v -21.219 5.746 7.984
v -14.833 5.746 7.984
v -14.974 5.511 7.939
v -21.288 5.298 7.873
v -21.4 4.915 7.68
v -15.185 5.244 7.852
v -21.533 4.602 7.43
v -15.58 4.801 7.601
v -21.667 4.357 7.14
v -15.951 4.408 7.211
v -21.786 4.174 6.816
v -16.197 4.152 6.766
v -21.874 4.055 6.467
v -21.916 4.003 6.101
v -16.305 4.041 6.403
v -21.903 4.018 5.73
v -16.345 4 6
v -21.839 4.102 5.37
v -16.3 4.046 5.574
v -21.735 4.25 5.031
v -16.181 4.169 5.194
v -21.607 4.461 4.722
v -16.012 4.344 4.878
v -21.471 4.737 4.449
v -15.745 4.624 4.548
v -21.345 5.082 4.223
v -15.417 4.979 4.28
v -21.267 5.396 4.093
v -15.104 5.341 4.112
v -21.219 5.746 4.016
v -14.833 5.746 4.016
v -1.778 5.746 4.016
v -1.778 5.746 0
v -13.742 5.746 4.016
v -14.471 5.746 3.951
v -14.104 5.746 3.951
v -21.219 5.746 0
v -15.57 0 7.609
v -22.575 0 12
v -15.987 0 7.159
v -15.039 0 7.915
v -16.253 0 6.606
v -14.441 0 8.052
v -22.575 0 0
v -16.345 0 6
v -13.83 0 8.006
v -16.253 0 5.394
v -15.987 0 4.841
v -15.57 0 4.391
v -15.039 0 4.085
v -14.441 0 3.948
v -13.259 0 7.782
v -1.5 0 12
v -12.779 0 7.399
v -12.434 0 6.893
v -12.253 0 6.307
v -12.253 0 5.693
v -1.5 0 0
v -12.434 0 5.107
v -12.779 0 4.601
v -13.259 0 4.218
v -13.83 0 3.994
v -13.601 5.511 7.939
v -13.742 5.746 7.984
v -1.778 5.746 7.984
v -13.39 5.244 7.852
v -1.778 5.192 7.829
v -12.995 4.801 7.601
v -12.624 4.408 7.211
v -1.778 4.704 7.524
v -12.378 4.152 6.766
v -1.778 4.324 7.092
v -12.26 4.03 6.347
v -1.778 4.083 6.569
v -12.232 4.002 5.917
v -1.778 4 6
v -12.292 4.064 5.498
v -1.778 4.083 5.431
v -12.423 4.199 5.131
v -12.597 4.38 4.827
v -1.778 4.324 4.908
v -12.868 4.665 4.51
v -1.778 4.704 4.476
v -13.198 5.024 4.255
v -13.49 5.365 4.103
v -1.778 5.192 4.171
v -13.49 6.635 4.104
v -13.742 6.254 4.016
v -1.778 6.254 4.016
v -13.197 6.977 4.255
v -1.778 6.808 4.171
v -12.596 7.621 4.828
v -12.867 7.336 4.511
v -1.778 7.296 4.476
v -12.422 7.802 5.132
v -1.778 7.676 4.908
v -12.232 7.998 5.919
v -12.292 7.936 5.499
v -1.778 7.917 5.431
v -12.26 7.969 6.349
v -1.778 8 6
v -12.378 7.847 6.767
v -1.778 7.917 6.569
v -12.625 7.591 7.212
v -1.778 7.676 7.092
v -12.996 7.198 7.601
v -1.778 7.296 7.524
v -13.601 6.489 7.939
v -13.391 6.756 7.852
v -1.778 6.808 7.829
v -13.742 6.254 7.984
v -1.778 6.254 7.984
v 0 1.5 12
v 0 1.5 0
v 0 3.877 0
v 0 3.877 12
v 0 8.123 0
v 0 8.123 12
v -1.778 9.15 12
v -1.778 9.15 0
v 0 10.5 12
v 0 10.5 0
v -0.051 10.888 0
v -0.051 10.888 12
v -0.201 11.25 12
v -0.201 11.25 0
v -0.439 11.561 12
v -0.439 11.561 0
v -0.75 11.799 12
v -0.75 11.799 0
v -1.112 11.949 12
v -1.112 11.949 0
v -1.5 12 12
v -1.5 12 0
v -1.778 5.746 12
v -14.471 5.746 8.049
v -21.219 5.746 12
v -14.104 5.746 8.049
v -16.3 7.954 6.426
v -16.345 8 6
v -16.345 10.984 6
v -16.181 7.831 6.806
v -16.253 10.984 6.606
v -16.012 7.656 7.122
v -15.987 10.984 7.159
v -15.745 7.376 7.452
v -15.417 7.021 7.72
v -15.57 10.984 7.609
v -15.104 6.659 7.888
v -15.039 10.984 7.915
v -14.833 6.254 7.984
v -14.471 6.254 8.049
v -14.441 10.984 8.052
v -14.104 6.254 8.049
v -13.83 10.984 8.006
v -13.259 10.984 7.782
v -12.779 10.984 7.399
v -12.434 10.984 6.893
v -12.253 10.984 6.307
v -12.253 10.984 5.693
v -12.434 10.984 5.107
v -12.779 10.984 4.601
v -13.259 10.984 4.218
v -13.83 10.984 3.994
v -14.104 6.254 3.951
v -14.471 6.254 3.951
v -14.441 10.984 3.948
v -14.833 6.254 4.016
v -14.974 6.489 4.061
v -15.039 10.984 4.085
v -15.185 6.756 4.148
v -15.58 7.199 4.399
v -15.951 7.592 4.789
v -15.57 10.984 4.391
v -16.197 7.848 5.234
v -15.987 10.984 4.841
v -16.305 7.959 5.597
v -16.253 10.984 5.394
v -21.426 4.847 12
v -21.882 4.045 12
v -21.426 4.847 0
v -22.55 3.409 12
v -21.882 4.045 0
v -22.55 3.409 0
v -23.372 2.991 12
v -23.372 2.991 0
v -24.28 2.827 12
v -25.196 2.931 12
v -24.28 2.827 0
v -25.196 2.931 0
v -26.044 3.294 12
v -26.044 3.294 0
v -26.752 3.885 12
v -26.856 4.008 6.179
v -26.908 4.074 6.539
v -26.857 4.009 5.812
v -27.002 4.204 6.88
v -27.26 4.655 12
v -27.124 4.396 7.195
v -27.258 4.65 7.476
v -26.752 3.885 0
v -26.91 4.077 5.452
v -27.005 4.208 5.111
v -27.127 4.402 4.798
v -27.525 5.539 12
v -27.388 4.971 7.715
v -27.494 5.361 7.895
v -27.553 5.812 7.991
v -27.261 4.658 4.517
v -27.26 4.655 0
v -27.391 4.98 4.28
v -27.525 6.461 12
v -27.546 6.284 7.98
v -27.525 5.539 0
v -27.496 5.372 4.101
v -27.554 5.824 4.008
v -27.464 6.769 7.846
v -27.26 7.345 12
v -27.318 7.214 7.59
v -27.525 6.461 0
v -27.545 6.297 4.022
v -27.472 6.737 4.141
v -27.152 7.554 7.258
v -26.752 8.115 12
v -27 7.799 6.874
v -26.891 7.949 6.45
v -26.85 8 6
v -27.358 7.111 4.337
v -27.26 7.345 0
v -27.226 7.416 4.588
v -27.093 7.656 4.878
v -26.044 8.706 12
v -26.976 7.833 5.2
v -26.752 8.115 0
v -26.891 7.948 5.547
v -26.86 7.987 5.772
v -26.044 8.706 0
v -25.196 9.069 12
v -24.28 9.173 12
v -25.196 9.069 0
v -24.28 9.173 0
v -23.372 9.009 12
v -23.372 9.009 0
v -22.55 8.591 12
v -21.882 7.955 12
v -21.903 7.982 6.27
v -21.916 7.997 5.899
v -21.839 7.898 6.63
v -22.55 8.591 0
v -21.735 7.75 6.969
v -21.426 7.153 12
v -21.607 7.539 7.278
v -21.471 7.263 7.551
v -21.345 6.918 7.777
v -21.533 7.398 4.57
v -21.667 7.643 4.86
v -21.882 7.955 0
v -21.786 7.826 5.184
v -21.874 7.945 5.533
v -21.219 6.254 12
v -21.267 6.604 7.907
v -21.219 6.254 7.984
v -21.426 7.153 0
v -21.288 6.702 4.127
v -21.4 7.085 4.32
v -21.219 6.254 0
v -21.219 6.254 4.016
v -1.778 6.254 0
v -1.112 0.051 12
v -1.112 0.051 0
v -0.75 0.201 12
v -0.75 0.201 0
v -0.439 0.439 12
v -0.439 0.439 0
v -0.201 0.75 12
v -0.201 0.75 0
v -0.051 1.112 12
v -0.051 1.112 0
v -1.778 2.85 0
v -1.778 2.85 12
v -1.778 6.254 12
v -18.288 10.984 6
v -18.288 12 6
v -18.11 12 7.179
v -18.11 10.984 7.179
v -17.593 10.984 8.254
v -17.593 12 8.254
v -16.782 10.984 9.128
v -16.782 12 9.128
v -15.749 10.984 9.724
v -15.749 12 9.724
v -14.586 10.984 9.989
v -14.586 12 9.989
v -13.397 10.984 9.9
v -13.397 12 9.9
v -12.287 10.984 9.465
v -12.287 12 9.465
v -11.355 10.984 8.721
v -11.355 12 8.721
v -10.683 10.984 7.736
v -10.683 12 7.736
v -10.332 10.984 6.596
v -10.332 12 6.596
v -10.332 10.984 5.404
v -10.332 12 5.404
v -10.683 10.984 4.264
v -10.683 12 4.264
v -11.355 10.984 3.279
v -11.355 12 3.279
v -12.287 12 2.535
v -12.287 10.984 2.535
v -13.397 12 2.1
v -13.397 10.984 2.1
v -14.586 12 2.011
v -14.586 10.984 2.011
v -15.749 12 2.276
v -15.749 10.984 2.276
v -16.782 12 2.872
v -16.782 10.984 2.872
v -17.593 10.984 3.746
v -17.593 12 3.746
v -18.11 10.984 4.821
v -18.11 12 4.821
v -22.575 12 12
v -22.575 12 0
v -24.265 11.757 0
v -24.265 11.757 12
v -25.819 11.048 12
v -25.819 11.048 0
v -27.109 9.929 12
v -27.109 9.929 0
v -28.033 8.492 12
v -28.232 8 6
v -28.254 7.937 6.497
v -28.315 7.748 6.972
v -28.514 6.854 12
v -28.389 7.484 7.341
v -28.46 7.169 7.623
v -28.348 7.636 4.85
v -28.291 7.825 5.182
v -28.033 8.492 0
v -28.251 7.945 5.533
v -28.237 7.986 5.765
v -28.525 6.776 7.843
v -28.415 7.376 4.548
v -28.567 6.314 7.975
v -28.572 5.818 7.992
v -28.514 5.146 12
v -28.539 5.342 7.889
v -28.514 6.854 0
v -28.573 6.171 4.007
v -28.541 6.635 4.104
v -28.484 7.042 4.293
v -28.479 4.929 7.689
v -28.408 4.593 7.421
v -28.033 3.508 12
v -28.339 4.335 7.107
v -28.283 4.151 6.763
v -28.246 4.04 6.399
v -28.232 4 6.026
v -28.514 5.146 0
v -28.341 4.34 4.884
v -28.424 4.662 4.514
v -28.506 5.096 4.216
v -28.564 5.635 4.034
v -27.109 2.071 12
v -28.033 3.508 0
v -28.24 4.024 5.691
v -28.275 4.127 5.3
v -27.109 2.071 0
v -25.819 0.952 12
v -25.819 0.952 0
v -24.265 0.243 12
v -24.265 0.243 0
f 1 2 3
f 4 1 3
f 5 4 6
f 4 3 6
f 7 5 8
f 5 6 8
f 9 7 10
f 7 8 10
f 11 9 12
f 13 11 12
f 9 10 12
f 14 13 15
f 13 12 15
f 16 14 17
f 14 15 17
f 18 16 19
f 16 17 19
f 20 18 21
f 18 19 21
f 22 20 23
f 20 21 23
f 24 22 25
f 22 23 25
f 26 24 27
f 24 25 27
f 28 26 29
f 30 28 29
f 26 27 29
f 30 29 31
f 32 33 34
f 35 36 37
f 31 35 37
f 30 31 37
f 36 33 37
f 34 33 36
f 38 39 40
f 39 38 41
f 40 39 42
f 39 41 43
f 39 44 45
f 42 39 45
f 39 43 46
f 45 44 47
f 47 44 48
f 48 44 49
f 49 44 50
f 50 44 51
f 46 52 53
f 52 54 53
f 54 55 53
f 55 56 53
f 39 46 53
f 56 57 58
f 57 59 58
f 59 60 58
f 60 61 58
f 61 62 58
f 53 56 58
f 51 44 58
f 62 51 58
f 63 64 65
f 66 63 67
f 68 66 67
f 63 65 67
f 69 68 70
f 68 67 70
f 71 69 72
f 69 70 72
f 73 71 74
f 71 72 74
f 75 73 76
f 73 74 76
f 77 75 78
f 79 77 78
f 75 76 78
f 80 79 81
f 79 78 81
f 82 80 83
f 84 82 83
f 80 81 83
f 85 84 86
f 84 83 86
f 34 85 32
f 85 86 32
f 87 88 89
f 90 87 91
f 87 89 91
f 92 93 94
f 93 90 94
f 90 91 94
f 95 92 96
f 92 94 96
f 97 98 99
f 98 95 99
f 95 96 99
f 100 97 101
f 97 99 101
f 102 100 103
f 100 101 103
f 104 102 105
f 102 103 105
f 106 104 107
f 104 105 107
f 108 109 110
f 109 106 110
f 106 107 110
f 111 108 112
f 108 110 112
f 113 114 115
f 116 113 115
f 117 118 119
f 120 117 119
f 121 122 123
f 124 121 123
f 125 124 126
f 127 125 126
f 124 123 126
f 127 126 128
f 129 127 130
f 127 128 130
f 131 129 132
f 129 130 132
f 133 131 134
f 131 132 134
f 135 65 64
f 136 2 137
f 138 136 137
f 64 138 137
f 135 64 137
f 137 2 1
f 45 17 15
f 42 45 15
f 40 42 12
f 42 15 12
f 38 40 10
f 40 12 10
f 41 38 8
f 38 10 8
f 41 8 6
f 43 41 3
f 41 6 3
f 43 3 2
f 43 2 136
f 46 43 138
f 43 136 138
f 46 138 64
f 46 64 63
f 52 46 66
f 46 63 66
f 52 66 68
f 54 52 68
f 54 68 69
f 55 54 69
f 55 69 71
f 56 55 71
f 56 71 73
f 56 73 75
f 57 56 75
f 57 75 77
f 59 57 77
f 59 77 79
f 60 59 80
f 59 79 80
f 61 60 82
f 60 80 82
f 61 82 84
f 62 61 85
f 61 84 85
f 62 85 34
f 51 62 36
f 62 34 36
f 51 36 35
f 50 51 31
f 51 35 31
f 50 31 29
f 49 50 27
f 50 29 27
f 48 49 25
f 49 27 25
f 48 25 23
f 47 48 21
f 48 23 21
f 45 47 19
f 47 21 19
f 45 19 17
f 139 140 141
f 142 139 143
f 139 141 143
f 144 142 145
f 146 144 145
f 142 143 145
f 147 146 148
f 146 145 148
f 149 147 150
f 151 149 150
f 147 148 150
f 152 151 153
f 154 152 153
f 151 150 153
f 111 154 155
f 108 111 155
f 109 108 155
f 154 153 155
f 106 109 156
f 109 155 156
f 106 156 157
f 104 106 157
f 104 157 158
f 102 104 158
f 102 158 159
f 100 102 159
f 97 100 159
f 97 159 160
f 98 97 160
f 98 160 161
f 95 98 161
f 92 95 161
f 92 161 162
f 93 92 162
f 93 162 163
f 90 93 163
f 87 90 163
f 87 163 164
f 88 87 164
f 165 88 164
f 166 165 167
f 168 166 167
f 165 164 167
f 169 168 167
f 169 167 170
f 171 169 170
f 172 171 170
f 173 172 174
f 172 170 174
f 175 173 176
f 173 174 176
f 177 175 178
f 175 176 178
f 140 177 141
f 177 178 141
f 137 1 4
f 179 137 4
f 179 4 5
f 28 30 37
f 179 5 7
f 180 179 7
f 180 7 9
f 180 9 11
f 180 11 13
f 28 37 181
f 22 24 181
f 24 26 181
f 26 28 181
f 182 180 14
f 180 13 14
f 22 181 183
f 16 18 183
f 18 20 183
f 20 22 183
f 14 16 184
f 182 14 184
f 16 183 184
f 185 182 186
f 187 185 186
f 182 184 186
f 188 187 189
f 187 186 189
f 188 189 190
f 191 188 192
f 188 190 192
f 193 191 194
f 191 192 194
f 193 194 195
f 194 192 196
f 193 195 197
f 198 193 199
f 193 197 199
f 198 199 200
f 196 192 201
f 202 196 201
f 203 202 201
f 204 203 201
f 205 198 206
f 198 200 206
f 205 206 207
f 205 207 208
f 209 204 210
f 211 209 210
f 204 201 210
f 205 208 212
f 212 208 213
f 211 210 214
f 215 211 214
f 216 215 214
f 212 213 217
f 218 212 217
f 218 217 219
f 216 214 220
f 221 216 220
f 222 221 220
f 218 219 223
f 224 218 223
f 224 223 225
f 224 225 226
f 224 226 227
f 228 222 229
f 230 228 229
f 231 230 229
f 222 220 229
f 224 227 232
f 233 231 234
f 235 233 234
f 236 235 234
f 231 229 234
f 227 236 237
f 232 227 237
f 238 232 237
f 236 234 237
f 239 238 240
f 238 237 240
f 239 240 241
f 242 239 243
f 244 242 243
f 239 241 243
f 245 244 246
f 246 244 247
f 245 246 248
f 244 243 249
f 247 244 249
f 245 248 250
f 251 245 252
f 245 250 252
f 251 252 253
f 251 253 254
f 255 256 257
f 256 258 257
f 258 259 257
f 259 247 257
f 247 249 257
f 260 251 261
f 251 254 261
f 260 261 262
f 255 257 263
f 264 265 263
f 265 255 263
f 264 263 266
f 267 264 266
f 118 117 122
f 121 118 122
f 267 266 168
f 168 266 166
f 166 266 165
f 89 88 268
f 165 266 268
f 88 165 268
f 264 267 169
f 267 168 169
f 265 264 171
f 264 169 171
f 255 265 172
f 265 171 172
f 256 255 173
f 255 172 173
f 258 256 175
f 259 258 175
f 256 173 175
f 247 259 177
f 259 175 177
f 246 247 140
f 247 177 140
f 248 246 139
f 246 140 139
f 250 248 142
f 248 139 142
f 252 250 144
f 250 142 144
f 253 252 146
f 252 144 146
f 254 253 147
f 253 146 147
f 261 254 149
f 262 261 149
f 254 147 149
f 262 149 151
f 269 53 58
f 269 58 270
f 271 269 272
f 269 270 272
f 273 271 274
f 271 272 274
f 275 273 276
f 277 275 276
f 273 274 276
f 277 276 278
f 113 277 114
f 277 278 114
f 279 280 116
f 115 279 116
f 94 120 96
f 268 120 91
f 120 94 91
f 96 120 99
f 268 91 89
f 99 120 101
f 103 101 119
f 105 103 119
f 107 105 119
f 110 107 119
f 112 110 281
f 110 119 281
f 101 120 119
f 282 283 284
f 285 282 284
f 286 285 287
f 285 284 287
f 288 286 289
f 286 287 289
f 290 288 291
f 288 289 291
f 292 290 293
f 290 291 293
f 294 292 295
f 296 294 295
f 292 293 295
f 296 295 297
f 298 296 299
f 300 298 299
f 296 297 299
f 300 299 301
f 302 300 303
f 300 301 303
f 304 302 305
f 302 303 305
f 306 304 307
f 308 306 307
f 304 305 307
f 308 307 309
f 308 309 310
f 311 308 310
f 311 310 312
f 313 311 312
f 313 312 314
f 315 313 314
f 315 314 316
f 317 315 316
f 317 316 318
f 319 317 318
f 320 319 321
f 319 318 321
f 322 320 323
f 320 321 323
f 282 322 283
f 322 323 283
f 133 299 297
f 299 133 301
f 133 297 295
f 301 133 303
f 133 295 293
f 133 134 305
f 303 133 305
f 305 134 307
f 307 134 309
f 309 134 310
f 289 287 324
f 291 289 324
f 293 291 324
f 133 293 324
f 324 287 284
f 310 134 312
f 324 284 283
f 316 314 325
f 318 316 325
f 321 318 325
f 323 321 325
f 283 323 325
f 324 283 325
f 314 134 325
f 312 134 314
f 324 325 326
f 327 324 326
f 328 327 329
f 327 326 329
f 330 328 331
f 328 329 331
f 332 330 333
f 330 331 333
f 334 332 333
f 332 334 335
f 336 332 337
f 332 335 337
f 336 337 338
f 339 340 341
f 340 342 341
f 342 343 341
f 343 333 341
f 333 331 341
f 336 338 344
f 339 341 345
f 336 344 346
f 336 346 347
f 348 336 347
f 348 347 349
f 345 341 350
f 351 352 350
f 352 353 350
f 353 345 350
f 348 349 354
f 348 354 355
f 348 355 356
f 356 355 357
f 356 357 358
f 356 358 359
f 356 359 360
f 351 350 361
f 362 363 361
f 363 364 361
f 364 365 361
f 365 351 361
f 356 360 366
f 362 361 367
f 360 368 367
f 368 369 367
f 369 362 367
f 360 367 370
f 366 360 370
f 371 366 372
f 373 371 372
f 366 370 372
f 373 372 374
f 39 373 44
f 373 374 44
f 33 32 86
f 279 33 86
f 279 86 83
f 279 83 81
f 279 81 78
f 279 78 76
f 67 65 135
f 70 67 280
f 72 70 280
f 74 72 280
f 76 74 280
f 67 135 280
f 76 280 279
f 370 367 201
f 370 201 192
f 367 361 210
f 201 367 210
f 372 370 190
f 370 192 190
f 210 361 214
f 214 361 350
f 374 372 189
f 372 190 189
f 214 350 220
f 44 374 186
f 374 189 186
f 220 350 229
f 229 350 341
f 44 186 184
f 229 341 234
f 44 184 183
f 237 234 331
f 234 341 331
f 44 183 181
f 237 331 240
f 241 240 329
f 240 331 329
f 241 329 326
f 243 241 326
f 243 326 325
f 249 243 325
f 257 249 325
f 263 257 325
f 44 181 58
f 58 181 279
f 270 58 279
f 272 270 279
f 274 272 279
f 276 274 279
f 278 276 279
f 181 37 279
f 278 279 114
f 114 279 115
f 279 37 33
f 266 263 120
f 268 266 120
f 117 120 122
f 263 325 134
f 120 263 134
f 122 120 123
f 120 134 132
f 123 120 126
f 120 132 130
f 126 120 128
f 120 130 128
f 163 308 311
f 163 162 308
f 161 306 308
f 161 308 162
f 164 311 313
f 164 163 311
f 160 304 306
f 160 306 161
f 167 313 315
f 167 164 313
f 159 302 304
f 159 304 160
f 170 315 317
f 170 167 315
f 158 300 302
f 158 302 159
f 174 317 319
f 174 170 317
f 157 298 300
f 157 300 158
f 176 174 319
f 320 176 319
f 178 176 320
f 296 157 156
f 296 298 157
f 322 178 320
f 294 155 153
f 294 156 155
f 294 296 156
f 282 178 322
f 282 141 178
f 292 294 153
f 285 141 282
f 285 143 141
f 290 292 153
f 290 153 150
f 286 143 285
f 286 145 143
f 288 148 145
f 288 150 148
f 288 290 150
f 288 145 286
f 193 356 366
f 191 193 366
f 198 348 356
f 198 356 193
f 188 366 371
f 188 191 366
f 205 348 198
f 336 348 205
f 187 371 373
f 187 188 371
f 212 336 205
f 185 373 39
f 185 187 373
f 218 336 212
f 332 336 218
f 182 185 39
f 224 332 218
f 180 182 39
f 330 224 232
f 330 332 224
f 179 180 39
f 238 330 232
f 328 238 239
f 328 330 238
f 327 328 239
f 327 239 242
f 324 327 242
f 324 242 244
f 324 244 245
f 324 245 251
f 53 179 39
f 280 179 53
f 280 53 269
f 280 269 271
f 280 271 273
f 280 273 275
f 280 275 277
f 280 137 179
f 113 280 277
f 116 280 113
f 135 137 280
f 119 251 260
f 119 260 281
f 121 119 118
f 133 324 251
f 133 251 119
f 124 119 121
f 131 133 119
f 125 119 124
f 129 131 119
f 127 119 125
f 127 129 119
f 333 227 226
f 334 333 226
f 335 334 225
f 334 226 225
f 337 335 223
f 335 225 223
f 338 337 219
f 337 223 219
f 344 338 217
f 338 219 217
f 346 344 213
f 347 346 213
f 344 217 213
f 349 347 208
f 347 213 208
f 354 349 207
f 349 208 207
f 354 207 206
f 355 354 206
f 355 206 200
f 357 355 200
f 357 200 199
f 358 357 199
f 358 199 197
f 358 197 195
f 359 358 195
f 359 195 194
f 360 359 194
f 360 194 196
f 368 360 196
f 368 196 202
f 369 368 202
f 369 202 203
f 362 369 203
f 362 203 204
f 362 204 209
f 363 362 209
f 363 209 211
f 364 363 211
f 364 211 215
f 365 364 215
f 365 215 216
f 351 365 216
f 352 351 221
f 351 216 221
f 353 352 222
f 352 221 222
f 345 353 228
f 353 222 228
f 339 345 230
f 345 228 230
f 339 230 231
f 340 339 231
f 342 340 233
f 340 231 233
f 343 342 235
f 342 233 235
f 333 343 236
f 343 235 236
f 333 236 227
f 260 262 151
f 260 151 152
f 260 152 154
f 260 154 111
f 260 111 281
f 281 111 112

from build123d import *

# Parameters (mm, degrees)
F1_DEPTH = 12
F2_R     = 2.0574
F3_DEPTH = 12.001
F4_R     = 4.0005
F5_DEPTH = 1.016
F6_R     = 2
F7_DEPTH = 28.576
F9_DEPTH = 12.001


with BuildPart() as f1:
    # F0 (on Top) → F1 (new body)
    with BuildSketch(Plane.XY):
        with BuildLine():
            Line((-22.575, 0), (-1.5, 0))
            ThreePointArc((-1.5, 0), (-0.43934, 0.43934), (0, 1.5))
            Line((0, 1.5), (0, 5.746))
            Line((0, 5.746), (-21.219176, 5.746))
            ThreePointArc((-21.219176, 5.746), (-27.559, 6), (-21.219176, 6.254))
            Line((-21.219176, 6.254), (0, 6.254))
            Line((0, 6.254), (0, 10.5))
            ThreePointArc((0, 10.5), (-0.43934, 11.56066), (-1.5, 12))
            Line((-1.5, 12), (-22.575, 12))
            ThreePointArc((-22.575, 12), (-28.575, 6), (-22.575, 0))
        make_face()
    extrude(amount=F1_DEPTH)

    # F2 (on face) → F3 (cut, through all)
    with BuildSketch(Plane(origin=(0, 12, 0), x_dir=(-1, 0, 0), z_dir=(0, 1, 0))):
        with Locations((14.2875, 6)):
            Circle(F2_R)
    extrude(amount=-F3_DEPTH, mode=Mode.SUBTRACT)

    # F4 (on face) → F5 (cut)
    with BuildSketch(Plane(origin=(0, 12, 0), x_dir=(-1, 0, 0), z_dir=(0, 1, 0))):
        with Locations((14.2875, 6)):
            Circle(F4_R)
    extrude(amount=-F5_DEPTH, mode=Mode.SUBTRACT)

    # F6 (on face) → F7 (cut, through all)
    with BuildSketch(Plane.YZ):
        with Locations((6, 6)):
            Circle(F6_R)
    extrude(amount=-F7_DEPTH, mode=Mode.SUBTRACT)

    # F8 (on face) → F9 (cut, through all)
    with BuildSketch(Plane.XY.offset(12)):
        Polygon((0, 6.254), (0, 8.123071), (-1.778, 9.1496), (-1.778, 2.8504), (0, 3.876929), (0, 5.746), align=None)
    extrude(amount=-F9_DEPTH, mode=Mode.SUBTRACT)


solid = f1.part
